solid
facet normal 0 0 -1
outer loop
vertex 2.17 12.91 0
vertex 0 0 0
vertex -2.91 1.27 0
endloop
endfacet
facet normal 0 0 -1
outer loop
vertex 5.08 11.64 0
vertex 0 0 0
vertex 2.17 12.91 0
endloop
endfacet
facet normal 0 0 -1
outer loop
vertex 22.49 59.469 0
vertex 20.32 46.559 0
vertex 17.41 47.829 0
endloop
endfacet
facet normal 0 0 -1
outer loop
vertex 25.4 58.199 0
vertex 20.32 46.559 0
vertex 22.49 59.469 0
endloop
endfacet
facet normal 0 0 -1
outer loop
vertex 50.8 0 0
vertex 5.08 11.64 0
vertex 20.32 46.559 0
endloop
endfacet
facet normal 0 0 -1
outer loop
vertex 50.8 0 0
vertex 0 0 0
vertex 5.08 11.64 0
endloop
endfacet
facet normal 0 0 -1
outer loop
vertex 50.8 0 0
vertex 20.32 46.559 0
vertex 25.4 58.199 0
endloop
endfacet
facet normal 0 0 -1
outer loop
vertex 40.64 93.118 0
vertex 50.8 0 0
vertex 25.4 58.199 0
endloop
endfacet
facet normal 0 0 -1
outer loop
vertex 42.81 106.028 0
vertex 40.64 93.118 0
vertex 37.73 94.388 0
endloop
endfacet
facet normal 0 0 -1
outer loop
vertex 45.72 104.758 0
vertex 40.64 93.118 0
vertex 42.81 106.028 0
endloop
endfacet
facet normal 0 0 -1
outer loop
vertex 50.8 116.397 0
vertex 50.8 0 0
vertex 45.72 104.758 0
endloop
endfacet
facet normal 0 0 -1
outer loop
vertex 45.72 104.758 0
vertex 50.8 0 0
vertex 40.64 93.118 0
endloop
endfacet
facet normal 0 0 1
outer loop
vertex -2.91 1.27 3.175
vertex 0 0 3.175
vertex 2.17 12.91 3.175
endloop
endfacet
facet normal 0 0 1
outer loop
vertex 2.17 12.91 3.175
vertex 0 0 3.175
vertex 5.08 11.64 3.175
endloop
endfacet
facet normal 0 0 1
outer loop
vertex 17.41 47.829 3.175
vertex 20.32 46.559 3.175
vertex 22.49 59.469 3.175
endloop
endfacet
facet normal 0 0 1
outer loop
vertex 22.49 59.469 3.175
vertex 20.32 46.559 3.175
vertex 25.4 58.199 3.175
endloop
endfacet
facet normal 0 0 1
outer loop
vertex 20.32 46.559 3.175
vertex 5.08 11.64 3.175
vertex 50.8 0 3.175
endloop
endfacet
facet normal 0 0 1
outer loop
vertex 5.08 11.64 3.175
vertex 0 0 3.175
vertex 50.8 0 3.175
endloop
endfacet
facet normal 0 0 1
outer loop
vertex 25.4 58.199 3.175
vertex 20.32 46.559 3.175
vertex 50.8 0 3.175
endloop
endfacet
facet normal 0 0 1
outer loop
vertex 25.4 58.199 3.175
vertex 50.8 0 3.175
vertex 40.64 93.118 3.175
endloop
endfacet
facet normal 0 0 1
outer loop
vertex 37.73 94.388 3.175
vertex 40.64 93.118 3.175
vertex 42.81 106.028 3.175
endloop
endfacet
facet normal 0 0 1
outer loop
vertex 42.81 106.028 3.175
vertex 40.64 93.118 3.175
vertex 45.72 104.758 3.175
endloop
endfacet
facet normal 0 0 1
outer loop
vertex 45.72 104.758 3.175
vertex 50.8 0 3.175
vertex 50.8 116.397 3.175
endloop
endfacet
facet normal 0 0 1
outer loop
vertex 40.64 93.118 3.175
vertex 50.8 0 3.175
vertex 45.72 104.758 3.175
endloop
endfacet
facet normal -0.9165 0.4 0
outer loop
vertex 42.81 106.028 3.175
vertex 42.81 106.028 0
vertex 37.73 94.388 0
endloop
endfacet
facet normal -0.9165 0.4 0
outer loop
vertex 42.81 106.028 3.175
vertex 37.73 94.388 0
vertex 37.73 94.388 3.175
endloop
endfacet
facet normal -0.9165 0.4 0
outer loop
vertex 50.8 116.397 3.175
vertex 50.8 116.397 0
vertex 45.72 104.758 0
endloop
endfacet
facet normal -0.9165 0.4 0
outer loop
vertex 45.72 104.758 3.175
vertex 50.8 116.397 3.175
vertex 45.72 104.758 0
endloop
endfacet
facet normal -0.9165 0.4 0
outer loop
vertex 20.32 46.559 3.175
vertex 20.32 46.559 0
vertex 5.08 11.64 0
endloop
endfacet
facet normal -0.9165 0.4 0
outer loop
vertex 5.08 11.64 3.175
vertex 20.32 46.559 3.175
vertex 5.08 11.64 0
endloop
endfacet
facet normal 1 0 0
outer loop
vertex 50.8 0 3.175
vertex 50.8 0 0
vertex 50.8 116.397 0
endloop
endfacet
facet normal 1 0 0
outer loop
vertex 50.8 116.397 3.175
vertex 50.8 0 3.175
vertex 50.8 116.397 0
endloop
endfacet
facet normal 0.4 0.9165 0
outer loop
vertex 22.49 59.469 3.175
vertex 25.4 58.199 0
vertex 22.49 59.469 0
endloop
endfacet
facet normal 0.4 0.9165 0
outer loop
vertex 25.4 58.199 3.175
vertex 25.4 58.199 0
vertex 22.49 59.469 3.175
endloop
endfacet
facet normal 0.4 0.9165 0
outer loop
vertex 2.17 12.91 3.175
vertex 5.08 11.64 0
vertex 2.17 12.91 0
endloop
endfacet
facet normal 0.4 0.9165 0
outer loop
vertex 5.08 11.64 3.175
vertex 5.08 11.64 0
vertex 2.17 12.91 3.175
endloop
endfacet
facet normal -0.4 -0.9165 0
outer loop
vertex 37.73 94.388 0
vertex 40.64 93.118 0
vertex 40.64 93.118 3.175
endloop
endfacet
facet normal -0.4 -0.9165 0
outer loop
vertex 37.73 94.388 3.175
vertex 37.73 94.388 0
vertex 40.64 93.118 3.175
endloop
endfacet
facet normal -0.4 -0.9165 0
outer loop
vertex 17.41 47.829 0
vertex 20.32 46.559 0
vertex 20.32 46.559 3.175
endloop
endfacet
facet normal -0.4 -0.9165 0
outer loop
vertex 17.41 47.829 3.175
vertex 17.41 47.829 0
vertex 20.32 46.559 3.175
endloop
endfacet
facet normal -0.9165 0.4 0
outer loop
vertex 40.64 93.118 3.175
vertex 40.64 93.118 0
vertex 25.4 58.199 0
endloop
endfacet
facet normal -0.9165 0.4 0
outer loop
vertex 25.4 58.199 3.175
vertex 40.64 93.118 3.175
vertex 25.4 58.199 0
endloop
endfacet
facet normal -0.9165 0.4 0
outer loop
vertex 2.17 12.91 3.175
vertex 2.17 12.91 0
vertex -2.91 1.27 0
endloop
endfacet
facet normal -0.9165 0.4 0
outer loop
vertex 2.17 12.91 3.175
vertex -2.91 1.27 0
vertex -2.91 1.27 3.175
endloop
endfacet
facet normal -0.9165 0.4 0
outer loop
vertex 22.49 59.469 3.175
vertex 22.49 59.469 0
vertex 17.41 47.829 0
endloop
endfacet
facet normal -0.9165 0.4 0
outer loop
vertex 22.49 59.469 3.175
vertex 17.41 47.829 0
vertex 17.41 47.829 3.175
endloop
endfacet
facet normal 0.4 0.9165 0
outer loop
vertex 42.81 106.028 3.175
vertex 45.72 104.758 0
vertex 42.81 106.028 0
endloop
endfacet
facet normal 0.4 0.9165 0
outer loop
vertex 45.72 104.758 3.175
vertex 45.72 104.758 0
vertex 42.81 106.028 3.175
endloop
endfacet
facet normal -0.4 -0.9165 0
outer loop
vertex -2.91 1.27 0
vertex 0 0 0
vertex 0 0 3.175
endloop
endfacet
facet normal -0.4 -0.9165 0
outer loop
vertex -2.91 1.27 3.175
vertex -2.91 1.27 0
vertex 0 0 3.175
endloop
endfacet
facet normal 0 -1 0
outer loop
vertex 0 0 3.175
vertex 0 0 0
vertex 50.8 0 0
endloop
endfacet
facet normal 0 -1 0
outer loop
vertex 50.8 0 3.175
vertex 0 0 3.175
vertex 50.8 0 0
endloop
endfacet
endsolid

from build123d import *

# Parameters (mm, degrees)
EXTRUDE1_DEPTH  = 3.175
SKETCH2_W       = 3.175
SKETCH2_H       = 12.7
EXTRUDE2_DEPTH  = 3.175
LPATTERN1_COUNT = 3
LPATTERN1_PITCH = 50.8


with BuildPart() as part:
    # Sketch1 → Extrude1 (new body)
    with BuildSketch(Plane.XY):
        Polygon((0, 0), (50.8, 0), (50.8, 116.397422652), align=None)
    extrude(amount=EXTRUDE1_DEPTH)

    # Sketch2 → Extrude2 (add)
    with BuildSketch(Plane(origin=(0, 0, 0), x_dir=(0, 0, 1), z_dir=(-0.916515139, 0.4, 0))):
        with Locations((1.5875, 6.35)):
            Rectangle(SKETCH2_W, SKETCH2_H)
    extrude2 = extrude(amount=EXTRUDE2_DEPTH)

    # LPattern1: Extrude2 ×3
    with Locations(*[Vector(0.4, 0.916515139, 0) * (i * LPATTERN1_PITCH) for i in range(1, LPATTERN1_COUNT)]):
        add(extrude2)


solid = part.part
